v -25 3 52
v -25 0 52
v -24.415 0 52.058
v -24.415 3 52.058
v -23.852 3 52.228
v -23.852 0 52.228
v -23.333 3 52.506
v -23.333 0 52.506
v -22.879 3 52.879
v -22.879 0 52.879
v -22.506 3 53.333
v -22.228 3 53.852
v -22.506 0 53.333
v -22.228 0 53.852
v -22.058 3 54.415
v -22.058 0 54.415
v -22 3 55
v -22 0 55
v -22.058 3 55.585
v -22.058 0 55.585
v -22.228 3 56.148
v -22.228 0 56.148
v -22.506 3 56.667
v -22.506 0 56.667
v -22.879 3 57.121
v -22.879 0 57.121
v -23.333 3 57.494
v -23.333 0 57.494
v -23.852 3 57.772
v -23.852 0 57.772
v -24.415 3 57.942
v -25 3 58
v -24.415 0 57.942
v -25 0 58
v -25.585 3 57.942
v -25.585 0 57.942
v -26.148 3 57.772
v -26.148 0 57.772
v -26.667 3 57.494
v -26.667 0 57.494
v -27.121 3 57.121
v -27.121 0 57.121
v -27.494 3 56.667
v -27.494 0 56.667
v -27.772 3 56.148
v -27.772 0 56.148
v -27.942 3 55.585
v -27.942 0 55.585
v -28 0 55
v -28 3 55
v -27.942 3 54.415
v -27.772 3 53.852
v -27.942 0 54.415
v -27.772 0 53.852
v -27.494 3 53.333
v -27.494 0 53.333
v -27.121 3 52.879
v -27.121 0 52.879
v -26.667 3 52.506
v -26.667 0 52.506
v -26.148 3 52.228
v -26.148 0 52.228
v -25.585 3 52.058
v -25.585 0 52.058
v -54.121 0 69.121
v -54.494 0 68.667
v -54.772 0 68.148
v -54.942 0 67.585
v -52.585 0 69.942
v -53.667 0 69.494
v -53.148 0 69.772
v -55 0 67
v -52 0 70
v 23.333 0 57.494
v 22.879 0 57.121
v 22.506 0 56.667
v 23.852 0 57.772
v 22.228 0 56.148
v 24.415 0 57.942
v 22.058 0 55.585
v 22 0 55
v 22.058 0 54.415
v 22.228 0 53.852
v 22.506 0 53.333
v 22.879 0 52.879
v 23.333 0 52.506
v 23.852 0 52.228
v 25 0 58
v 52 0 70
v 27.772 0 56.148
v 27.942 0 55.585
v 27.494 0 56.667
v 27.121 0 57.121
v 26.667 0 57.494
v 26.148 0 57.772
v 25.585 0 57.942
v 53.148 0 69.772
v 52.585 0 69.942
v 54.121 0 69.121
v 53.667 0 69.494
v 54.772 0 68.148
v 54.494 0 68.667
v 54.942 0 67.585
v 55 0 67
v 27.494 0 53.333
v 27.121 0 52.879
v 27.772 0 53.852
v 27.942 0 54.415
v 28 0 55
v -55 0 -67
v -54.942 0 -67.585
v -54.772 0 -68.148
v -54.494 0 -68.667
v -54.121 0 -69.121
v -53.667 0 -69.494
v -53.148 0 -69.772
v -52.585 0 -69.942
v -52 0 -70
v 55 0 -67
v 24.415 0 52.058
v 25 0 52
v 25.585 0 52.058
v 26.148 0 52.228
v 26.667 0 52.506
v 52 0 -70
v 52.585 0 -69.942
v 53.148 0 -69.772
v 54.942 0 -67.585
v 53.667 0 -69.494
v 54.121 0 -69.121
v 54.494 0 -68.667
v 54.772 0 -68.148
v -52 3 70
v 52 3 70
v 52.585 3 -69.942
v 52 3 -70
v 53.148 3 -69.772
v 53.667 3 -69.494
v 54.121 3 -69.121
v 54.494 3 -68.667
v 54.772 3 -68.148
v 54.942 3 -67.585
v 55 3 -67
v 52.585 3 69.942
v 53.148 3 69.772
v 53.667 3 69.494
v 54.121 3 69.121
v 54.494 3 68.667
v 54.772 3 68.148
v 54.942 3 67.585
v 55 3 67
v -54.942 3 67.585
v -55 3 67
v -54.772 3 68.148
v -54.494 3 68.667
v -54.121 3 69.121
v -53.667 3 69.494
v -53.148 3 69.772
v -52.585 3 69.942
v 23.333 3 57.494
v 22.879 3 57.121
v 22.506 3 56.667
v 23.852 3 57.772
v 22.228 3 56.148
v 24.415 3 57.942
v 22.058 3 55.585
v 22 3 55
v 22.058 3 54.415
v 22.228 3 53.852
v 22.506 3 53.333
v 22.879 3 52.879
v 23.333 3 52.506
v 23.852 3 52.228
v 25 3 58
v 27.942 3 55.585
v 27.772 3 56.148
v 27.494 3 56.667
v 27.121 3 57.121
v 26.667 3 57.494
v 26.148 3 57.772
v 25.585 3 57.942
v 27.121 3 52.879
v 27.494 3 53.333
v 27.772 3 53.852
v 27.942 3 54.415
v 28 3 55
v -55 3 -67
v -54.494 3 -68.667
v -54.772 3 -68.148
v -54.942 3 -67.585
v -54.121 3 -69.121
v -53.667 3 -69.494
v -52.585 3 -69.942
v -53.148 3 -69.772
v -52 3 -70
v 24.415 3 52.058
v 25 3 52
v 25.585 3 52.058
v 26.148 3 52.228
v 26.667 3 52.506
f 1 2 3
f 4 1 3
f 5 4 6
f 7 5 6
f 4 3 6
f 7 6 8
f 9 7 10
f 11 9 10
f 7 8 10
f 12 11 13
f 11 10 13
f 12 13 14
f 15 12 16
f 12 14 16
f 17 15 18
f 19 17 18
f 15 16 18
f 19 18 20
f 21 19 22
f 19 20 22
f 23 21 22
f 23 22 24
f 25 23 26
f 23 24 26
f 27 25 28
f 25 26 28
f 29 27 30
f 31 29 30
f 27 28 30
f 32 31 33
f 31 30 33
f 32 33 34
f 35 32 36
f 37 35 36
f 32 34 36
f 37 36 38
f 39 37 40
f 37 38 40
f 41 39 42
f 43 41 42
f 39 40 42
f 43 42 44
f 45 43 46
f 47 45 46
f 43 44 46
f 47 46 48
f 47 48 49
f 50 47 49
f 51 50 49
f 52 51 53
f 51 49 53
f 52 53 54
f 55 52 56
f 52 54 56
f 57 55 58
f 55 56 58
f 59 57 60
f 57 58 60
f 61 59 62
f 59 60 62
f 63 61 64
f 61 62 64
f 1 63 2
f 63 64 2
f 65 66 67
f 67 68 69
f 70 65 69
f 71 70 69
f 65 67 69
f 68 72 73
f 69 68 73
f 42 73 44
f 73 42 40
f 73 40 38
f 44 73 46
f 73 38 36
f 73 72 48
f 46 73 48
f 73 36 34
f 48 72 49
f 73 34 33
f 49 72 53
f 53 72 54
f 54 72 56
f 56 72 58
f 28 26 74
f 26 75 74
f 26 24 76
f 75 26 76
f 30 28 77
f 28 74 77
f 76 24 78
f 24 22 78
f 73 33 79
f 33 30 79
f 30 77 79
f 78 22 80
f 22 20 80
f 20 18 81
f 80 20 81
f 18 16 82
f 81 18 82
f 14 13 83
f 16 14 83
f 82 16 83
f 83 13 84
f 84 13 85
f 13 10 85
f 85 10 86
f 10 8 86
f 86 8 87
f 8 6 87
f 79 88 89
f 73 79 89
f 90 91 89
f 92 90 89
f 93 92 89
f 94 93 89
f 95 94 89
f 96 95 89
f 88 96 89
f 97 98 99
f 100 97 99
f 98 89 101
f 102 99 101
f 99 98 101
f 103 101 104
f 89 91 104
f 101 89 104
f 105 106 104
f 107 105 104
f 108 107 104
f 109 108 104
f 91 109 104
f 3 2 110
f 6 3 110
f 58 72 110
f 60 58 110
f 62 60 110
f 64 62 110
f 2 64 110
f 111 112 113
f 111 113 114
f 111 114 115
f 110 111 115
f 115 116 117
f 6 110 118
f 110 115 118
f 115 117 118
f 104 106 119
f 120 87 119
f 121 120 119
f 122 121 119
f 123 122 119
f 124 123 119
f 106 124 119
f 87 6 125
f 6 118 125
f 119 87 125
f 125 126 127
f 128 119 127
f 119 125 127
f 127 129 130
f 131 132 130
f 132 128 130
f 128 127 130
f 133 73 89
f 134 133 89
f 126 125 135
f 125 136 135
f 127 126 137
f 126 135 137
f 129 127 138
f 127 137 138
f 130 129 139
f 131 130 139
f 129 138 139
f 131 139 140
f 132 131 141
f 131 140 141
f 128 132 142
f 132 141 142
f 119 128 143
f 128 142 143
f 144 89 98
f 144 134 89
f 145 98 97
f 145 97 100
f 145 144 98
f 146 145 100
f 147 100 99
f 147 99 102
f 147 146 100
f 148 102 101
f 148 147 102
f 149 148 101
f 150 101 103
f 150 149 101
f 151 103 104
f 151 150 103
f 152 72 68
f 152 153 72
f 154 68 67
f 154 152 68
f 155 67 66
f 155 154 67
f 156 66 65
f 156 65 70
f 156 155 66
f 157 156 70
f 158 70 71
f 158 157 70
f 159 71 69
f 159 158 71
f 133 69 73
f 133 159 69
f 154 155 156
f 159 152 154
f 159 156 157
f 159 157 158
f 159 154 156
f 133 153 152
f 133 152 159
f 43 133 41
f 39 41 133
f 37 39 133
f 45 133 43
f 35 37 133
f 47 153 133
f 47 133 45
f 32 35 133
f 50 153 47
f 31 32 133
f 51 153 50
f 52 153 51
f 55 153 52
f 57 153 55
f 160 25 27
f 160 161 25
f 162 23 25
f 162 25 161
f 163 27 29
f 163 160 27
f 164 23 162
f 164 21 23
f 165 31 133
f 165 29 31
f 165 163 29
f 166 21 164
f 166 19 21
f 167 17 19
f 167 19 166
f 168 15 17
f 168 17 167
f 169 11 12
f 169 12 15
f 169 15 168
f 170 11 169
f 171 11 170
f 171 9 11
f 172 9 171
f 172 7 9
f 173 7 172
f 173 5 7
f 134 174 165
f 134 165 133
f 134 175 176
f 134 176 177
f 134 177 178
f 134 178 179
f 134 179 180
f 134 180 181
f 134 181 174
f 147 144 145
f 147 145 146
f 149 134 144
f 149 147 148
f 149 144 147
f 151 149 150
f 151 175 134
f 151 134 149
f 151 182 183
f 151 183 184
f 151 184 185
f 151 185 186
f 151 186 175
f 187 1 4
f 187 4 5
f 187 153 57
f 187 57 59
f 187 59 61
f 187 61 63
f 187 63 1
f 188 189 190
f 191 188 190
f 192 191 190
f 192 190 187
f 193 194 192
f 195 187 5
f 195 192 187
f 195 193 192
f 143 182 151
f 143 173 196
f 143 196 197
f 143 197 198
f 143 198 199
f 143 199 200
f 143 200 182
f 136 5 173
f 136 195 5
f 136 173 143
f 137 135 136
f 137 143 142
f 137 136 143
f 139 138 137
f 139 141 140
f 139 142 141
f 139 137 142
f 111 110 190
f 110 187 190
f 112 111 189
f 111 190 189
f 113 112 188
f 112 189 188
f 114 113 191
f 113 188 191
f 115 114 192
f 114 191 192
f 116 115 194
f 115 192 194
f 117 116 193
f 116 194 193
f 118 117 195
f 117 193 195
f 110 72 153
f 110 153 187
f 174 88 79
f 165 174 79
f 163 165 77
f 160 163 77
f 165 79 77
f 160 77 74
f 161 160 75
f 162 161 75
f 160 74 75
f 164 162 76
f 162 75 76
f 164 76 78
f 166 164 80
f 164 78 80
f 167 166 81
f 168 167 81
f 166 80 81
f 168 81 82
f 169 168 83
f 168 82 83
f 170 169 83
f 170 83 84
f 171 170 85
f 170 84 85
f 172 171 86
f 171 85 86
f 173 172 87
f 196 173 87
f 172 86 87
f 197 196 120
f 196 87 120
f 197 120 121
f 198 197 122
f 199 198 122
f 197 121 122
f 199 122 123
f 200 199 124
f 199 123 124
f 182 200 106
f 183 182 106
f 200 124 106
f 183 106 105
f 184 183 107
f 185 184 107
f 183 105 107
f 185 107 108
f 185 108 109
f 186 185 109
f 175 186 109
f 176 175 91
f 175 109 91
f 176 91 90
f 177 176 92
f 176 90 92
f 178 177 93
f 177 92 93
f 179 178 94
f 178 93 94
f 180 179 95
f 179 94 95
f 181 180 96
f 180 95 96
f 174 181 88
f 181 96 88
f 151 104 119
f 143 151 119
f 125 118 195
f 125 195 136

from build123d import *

# Parameters (mm, degrees)
SKETCH_1_W          = 110
SKETCH_1_H          = 140
EXTRUDE_1_DEPTH     = 3
SKETCH_2_R          = 3
CUT_EXTRUDE_1_DEPTH = 3
FILLET_1_R          = 3


with BuildPart() as part:
    # 草图1 → 凸台-拉伸1 (new body)
    with BuildSketch(Plane(origin=(0, 0, 0), x_dir=(1, 0, 0), z_dir=(0, 1, 0))):
        Rectangle(SKETCH_1_W, SKETCH_1_H)
    extrude(amount=EXTRUDE_1_DEPTH)

    # 草图2 → 切除-拉伸1 (cut)
    with BuildSketch(Plane.XZ):
        with Locations(Location((-25, 55, 0), (0, 0, 270))):
            Circle(SKETCH_2_R)
        with Locations(Location((25, 55, 0), (0, 0, 90))):
            Circle(SKETCH_2_R)
    extrude(amount=-CUT_EXTRUDE_1_DEPTH, mode=Mode.SUBTRACT)

    # 圆角1
    fillet_1_edges = [part.edges().sort_by_distance(p)[0] for p in [
        (55, 1.5, 70),
        (-55, 1.5, 70),
        (-55, 1.5, -70),
        (55, 1.5, -70),
    ]]
    fillet(fillet_1_edges, radius=FILLET_1_R)


solid = part.part
